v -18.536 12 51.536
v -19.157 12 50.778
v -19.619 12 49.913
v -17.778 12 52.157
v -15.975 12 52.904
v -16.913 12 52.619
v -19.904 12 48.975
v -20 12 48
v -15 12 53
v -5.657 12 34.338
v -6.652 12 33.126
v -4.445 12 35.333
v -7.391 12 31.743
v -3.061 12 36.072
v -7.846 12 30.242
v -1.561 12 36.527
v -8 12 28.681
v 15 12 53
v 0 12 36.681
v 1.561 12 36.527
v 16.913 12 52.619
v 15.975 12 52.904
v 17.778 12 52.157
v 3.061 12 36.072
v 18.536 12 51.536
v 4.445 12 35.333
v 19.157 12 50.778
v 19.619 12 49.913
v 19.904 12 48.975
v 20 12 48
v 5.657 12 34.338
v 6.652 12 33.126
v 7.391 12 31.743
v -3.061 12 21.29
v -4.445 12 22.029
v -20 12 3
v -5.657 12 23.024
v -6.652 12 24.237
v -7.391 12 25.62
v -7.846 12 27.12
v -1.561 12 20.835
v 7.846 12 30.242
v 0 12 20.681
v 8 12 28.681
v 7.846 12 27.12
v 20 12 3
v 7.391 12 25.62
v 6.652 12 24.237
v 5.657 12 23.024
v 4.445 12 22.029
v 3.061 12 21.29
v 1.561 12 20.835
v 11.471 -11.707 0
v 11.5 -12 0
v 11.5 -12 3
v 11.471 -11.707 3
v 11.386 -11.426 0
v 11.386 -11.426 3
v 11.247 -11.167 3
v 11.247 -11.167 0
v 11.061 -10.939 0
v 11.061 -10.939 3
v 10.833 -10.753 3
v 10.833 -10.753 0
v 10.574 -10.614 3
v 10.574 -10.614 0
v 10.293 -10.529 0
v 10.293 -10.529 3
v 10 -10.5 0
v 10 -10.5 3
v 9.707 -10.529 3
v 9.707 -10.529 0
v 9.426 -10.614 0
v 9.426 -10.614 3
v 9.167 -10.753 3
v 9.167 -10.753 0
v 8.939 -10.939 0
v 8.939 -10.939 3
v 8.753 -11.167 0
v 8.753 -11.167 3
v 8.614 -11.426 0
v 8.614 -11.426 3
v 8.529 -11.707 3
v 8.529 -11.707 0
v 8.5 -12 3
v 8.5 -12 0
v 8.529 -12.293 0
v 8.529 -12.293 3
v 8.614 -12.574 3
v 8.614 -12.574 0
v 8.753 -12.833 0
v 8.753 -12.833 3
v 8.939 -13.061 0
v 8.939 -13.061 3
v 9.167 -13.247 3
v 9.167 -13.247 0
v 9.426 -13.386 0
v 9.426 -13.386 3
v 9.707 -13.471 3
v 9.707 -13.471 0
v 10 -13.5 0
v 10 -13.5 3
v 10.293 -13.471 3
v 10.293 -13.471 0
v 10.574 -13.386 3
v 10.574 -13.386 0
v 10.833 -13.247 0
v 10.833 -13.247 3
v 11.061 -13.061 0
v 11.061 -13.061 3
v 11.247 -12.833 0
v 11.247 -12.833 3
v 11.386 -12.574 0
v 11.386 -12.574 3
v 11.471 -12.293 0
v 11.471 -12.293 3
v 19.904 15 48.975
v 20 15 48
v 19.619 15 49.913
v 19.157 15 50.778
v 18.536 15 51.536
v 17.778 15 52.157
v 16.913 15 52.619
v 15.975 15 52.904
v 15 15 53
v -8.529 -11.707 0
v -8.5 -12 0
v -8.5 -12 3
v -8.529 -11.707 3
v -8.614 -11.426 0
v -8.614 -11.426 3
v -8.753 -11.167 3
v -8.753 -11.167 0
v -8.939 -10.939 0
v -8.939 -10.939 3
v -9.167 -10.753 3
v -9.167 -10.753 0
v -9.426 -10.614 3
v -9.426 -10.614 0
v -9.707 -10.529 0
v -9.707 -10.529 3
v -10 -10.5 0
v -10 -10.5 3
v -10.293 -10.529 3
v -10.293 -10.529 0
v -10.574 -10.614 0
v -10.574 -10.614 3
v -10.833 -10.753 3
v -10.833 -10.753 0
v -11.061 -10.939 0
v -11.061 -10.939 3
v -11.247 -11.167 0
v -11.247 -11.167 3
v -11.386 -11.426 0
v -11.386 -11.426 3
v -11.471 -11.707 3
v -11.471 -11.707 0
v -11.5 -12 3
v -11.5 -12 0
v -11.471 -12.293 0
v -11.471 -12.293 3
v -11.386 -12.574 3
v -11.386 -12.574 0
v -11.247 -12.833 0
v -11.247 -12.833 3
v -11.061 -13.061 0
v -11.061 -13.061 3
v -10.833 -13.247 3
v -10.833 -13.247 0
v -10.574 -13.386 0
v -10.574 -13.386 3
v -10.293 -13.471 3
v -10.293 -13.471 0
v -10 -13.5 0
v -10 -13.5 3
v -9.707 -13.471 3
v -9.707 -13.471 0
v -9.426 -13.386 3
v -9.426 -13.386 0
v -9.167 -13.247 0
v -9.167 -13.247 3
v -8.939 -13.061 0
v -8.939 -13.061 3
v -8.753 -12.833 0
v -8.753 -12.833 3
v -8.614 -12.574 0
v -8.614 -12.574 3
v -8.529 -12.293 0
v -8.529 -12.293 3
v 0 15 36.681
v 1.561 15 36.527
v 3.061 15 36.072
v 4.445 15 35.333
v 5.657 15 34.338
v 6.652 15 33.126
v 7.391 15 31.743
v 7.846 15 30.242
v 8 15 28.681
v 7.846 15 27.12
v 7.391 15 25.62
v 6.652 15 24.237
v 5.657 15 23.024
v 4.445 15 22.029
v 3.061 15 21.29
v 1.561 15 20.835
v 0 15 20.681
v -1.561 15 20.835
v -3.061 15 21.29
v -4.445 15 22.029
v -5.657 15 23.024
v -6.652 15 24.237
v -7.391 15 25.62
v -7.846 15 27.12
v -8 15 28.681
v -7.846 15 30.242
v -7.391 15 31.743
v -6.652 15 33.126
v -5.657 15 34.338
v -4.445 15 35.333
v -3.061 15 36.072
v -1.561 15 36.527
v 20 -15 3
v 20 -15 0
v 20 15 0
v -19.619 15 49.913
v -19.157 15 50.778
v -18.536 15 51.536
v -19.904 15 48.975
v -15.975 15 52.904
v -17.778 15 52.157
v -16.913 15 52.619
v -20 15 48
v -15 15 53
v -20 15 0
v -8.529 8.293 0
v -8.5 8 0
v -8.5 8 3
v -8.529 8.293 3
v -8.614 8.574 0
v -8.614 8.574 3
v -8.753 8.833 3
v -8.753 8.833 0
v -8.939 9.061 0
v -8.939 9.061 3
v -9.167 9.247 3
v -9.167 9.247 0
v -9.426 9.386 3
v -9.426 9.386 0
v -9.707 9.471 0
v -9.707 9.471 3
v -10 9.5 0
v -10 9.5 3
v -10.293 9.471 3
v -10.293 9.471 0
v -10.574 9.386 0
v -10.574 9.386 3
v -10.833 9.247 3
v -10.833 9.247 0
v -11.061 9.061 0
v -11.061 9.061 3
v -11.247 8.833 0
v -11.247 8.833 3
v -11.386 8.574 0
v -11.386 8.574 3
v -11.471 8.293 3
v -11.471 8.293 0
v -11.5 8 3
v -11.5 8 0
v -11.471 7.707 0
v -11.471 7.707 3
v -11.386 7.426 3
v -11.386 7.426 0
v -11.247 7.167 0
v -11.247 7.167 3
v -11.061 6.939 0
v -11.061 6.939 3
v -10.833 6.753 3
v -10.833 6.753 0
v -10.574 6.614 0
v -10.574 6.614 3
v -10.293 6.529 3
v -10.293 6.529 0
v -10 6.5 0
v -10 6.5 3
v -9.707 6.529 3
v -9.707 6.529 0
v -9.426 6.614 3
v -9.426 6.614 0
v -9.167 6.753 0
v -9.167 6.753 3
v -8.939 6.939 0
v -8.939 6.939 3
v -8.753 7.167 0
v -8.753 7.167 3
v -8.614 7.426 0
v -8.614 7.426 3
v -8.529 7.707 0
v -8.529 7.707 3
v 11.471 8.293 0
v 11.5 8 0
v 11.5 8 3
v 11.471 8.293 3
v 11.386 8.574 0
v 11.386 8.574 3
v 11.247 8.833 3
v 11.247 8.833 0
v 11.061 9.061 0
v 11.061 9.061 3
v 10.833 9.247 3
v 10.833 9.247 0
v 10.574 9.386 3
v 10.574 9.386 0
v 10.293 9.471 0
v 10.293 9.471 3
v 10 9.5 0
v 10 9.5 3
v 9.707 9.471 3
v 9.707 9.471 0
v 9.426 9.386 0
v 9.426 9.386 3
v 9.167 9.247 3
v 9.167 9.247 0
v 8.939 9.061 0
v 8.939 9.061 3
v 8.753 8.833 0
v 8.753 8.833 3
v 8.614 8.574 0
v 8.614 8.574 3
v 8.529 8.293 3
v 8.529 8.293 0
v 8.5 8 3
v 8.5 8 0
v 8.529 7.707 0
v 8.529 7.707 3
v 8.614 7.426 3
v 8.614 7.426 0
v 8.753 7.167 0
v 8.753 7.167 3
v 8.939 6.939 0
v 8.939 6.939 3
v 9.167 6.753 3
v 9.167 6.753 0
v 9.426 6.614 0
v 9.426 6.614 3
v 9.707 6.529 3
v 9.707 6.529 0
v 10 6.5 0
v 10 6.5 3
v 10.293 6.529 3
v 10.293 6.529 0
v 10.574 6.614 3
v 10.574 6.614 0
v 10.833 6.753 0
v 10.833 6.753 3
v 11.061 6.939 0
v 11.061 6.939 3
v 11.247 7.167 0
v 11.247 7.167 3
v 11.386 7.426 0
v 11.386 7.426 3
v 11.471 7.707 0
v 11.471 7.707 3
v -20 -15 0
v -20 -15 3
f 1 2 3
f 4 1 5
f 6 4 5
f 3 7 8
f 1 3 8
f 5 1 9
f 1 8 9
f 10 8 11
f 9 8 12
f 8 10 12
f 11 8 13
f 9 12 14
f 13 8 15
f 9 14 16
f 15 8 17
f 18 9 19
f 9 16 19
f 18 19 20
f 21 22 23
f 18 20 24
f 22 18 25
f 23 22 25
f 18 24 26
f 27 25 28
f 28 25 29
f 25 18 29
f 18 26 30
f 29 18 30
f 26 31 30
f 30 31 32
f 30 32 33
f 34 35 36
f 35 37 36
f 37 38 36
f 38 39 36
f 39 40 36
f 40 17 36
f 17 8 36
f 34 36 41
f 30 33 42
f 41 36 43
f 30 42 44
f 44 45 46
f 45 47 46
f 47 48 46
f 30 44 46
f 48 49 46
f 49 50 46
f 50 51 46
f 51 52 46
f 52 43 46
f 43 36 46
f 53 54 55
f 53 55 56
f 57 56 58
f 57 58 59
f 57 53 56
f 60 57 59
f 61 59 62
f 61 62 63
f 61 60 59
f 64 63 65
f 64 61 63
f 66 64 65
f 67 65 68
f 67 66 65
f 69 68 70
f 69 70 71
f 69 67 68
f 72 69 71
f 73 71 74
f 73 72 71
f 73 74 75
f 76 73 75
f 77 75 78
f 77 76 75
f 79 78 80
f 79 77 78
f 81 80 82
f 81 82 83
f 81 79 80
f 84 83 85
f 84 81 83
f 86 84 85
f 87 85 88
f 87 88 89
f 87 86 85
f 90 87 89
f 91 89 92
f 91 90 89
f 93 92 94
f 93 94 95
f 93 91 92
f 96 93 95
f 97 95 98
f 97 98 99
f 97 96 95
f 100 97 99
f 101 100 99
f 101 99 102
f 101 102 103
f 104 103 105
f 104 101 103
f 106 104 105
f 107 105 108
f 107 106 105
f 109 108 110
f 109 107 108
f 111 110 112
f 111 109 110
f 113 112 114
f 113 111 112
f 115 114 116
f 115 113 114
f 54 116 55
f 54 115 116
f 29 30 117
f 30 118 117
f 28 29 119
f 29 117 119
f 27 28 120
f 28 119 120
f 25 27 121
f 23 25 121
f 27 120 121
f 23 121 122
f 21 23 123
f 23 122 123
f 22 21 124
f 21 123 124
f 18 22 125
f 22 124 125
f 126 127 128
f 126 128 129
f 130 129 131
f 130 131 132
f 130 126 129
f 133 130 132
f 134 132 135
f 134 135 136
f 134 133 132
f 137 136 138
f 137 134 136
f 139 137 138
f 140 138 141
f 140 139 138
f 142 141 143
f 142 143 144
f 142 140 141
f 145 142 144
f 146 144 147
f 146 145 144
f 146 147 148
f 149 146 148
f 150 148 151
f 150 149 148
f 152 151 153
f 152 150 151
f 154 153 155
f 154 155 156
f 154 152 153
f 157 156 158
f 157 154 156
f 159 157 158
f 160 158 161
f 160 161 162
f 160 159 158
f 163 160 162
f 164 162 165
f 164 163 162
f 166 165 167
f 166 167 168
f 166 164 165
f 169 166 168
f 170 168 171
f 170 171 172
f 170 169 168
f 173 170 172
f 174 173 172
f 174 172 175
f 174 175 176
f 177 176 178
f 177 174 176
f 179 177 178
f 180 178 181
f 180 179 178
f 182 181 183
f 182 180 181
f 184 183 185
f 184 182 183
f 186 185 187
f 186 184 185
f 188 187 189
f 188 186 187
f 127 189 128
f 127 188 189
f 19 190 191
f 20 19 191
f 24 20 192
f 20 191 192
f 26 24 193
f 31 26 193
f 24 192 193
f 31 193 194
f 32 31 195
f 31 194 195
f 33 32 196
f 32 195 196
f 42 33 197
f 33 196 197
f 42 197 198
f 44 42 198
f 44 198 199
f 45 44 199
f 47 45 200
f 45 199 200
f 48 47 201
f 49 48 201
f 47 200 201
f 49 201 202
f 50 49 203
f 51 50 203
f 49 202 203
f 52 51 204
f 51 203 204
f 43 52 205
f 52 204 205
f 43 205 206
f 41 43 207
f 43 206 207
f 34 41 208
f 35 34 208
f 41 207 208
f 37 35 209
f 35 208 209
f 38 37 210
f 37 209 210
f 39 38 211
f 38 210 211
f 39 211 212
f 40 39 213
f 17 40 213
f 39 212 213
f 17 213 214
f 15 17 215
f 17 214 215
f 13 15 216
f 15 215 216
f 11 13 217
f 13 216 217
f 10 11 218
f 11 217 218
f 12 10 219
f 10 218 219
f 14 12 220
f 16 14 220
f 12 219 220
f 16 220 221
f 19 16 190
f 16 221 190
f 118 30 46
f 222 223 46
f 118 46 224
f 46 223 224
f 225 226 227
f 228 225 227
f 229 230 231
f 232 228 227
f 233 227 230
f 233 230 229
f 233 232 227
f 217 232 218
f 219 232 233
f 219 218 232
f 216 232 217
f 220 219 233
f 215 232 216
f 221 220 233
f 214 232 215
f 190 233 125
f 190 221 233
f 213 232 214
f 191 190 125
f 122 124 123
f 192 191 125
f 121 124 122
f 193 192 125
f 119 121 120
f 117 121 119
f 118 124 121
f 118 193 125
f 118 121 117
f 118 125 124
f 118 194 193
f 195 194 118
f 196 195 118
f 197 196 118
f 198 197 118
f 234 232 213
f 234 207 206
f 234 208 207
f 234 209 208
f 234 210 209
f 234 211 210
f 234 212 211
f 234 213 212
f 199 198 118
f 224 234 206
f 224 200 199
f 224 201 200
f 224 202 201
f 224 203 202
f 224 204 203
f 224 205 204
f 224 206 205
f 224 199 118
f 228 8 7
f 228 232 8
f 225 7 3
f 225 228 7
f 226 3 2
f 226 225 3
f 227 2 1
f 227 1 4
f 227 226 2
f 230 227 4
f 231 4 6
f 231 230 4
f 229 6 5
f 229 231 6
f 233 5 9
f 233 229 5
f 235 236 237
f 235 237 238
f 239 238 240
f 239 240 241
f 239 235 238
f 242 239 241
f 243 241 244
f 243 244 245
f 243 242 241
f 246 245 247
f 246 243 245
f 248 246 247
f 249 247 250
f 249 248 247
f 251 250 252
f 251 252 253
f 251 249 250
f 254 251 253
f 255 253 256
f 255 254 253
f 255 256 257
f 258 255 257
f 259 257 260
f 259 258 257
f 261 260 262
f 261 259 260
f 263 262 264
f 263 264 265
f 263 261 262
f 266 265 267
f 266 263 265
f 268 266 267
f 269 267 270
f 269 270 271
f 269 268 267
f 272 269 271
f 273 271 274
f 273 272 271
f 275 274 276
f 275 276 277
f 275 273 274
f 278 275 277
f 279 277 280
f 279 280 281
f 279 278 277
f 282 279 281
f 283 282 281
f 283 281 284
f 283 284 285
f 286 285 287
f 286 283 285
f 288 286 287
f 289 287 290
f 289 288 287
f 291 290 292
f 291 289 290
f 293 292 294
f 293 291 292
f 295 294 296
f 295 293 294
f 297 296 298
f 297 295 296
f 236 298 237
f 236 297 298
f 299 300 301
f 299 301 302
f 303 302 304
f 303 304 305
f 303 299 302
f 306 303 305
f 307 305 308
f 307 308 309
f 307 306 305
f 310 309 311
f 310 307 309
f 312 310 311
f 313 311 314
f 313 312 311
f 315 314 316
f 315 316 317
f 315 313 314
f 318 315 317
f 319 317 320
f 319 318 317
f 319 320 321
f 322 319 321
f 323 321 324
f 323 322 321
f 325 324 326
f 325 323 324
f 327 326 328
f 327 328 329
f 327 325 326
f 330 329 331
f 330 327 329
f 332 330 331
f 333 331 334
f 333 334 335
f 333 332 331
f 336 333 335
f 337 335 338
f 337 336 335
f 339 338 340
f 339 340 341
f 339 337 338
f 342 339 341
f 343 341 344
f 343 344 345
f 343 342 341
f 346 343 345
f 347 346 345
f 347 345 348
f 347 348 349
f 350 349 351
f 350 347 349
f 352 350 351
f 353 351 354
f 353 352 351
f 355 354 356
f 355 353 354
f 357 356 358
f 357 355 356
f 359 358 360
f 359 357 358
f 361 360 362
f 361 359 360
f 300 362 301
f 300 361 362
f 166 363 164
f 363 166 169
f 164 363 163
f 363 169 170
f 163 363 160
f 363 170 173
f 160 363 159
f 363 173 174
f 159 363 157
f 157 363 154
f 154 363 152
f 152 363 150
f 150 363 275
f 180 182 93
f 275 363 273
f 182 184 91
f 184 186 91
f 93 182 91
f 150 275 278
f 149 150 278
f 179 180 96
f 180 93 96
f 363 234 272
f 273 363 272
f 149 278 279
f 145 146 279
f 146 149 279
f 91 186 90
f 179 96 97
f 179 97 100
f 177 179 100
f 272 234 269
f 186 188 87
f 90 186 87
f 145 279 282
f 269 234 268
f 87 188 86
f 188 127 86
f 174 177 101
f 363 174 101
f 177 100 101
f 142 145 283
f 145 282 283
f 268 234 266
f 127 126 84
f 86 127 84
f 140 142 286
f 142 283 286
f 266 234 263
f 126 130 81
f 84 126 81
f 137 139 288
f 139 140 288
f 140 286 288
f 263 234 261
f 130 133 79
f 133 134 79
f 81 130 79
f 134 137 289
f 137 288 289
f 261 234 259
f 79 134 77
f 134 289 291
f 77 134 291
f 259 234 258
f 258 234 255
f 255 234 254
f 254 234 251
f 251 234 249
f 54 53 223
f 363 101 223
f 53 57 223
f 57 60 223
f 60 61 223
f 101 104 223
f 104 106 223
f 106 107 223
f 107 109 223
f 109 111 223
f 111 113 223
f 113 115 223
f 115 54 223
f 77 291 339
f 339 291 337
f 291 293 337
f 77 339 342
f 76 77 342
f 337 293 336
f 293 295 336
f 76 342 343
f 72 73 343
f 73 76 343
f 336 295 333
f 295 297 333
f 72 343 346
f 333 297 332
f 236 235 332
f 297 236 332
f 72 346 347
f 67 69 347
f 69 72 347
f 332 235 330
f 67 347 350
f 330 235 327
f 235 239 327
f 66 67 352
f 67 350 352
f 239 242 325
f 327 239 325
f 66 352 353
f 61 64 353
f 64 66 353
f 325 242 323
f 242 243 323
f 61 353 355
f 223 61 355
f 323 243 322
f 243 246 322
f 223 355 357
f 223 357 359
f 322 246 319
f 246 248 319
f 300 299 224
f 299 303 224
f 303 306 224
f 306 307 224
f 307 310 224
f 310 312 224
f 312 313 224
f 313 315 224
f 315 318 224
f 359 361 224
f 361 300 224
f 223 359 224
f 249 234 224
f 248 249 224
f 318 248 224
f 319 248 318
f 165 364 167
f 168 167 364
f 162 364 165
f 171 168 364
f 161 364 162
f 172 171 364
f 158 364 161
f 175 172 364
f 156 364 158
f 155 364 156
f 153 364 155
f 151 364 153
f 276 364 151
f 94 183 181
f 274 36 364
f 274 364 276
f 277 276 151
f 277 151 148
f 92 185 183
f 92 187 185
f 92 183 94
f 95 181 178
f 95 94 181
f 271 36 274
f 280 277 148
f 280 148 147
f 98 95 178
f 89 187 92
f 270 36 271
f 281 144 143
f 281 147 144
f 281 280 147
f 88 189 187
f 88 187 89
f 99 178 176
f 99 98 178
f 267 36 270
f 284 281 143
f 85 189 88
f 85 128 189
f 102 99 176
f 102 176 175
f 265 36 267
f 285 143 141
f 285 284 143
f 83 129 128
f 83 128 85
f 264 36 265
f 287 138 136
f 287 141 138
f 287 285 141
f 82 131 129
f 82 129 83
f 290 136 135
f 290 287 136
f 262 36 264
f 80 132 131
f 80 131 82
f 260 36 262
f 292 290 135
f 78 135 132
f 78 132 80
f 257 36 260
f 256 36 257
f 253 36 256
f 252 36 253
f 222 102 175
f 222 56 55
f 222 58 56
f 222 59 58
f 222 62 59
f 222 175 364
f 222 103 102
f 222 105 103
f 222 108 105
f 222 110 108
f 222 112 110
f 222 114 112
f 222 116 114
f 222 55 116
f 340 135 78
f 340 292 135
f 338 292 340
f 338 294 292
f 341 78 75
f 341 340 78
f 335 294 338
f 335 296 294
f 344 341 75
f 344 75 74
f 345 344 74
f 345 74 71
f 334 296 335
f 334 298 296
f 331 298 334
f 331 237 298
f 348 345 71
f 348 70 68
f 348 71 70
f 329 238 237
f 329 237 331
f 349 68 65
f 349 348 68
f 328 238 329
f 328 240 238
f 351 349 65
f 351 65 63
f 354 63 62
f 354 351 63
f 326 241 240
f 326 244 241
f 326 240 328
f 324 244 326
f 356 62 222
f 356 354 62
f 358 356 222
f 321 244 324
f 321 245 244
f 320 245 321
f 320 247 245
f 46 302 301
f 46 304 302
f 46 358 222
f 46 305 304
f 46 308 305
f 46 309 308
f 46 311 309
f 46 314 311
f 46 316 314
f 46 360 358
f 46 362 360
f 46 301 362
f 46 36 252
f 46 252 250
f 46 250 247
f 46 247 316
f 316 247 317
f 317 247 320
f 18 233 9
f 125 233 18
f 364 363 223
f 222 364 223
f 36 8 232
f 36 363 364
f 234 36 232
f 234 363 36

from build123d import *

# Parameters (mm, degrees)
SKETCH1_W           = 40
SKETCH1_H           = 30
SKETCH1_R           = 1.5
BOSS_EXTRUDE1_DEPTH = 3
SKETCH2_W           = 40
SKETCH2_H           = 3
BOSS_EXTRUDE2_DEPTH = 50
FILLET1_R           = 5
SKETCH3_R           = 8
CUT_EXTRUDE1_DEPTH  = 3


with BuildPart() as part:
    # Sketch1 → Boss-Extrude1 (new body)
    with BuildSketch(Plane.XY):
        Rectangle(SKETCH1_W, SKETCH1_H)
        with Locations((-10, 8)):
            Circle(SKETCH1_R, mode=Mode.SUBTRACT)
        with Locations((10, 8)):
            Circle(SKETCH1_R, mode=Mode.SUBTRACT)
        with Locations((-10, -12)):
            Circle(SKETCH1_R, mode=Mode.SUBTRACT)
        with Locations((10, -12)):
            Circle(SKETCH1_R, mode=Mode.SUBTRACT)
    extrude(amount=BOSS_EXTRUDE1_DEPTH)

    # Sketch2 → Boss-Extrude2 (add)
    with BuildSketch(Plane.XY.offset(3)):
        with Locations((0, 13.5)):
            Rectangle(SKETCH2_W, SKETCH2_H)
    extrude(amount=BOSS_EXTRUDE2_DEPTH)

    # Fillet1
    fillet1_edges = [part.edges().sort_by_distance(p)[0] for p in [
        (-20, 13.5, 53),
        (20, 13.5, 53),
    ]]
    fillet(fillet1_edges, radius=FILLET1_R)

    # Sketch3 → Cut-Extrude1 (cut)
    with BuildSketch(Plane(origin=(0, 15, 0), x_dir=(1, 0, 0), z_dir=(0, 1, 0))):
        with Locations(Location((0, -28.681080483, 0), (0, 0, 270))):
            Circle(SKETCH3_R)
    extrude(amount=-CUT_EXTRUDE1_DEPTH, mode=Mode.SUBTRACT)


solid = part.part
